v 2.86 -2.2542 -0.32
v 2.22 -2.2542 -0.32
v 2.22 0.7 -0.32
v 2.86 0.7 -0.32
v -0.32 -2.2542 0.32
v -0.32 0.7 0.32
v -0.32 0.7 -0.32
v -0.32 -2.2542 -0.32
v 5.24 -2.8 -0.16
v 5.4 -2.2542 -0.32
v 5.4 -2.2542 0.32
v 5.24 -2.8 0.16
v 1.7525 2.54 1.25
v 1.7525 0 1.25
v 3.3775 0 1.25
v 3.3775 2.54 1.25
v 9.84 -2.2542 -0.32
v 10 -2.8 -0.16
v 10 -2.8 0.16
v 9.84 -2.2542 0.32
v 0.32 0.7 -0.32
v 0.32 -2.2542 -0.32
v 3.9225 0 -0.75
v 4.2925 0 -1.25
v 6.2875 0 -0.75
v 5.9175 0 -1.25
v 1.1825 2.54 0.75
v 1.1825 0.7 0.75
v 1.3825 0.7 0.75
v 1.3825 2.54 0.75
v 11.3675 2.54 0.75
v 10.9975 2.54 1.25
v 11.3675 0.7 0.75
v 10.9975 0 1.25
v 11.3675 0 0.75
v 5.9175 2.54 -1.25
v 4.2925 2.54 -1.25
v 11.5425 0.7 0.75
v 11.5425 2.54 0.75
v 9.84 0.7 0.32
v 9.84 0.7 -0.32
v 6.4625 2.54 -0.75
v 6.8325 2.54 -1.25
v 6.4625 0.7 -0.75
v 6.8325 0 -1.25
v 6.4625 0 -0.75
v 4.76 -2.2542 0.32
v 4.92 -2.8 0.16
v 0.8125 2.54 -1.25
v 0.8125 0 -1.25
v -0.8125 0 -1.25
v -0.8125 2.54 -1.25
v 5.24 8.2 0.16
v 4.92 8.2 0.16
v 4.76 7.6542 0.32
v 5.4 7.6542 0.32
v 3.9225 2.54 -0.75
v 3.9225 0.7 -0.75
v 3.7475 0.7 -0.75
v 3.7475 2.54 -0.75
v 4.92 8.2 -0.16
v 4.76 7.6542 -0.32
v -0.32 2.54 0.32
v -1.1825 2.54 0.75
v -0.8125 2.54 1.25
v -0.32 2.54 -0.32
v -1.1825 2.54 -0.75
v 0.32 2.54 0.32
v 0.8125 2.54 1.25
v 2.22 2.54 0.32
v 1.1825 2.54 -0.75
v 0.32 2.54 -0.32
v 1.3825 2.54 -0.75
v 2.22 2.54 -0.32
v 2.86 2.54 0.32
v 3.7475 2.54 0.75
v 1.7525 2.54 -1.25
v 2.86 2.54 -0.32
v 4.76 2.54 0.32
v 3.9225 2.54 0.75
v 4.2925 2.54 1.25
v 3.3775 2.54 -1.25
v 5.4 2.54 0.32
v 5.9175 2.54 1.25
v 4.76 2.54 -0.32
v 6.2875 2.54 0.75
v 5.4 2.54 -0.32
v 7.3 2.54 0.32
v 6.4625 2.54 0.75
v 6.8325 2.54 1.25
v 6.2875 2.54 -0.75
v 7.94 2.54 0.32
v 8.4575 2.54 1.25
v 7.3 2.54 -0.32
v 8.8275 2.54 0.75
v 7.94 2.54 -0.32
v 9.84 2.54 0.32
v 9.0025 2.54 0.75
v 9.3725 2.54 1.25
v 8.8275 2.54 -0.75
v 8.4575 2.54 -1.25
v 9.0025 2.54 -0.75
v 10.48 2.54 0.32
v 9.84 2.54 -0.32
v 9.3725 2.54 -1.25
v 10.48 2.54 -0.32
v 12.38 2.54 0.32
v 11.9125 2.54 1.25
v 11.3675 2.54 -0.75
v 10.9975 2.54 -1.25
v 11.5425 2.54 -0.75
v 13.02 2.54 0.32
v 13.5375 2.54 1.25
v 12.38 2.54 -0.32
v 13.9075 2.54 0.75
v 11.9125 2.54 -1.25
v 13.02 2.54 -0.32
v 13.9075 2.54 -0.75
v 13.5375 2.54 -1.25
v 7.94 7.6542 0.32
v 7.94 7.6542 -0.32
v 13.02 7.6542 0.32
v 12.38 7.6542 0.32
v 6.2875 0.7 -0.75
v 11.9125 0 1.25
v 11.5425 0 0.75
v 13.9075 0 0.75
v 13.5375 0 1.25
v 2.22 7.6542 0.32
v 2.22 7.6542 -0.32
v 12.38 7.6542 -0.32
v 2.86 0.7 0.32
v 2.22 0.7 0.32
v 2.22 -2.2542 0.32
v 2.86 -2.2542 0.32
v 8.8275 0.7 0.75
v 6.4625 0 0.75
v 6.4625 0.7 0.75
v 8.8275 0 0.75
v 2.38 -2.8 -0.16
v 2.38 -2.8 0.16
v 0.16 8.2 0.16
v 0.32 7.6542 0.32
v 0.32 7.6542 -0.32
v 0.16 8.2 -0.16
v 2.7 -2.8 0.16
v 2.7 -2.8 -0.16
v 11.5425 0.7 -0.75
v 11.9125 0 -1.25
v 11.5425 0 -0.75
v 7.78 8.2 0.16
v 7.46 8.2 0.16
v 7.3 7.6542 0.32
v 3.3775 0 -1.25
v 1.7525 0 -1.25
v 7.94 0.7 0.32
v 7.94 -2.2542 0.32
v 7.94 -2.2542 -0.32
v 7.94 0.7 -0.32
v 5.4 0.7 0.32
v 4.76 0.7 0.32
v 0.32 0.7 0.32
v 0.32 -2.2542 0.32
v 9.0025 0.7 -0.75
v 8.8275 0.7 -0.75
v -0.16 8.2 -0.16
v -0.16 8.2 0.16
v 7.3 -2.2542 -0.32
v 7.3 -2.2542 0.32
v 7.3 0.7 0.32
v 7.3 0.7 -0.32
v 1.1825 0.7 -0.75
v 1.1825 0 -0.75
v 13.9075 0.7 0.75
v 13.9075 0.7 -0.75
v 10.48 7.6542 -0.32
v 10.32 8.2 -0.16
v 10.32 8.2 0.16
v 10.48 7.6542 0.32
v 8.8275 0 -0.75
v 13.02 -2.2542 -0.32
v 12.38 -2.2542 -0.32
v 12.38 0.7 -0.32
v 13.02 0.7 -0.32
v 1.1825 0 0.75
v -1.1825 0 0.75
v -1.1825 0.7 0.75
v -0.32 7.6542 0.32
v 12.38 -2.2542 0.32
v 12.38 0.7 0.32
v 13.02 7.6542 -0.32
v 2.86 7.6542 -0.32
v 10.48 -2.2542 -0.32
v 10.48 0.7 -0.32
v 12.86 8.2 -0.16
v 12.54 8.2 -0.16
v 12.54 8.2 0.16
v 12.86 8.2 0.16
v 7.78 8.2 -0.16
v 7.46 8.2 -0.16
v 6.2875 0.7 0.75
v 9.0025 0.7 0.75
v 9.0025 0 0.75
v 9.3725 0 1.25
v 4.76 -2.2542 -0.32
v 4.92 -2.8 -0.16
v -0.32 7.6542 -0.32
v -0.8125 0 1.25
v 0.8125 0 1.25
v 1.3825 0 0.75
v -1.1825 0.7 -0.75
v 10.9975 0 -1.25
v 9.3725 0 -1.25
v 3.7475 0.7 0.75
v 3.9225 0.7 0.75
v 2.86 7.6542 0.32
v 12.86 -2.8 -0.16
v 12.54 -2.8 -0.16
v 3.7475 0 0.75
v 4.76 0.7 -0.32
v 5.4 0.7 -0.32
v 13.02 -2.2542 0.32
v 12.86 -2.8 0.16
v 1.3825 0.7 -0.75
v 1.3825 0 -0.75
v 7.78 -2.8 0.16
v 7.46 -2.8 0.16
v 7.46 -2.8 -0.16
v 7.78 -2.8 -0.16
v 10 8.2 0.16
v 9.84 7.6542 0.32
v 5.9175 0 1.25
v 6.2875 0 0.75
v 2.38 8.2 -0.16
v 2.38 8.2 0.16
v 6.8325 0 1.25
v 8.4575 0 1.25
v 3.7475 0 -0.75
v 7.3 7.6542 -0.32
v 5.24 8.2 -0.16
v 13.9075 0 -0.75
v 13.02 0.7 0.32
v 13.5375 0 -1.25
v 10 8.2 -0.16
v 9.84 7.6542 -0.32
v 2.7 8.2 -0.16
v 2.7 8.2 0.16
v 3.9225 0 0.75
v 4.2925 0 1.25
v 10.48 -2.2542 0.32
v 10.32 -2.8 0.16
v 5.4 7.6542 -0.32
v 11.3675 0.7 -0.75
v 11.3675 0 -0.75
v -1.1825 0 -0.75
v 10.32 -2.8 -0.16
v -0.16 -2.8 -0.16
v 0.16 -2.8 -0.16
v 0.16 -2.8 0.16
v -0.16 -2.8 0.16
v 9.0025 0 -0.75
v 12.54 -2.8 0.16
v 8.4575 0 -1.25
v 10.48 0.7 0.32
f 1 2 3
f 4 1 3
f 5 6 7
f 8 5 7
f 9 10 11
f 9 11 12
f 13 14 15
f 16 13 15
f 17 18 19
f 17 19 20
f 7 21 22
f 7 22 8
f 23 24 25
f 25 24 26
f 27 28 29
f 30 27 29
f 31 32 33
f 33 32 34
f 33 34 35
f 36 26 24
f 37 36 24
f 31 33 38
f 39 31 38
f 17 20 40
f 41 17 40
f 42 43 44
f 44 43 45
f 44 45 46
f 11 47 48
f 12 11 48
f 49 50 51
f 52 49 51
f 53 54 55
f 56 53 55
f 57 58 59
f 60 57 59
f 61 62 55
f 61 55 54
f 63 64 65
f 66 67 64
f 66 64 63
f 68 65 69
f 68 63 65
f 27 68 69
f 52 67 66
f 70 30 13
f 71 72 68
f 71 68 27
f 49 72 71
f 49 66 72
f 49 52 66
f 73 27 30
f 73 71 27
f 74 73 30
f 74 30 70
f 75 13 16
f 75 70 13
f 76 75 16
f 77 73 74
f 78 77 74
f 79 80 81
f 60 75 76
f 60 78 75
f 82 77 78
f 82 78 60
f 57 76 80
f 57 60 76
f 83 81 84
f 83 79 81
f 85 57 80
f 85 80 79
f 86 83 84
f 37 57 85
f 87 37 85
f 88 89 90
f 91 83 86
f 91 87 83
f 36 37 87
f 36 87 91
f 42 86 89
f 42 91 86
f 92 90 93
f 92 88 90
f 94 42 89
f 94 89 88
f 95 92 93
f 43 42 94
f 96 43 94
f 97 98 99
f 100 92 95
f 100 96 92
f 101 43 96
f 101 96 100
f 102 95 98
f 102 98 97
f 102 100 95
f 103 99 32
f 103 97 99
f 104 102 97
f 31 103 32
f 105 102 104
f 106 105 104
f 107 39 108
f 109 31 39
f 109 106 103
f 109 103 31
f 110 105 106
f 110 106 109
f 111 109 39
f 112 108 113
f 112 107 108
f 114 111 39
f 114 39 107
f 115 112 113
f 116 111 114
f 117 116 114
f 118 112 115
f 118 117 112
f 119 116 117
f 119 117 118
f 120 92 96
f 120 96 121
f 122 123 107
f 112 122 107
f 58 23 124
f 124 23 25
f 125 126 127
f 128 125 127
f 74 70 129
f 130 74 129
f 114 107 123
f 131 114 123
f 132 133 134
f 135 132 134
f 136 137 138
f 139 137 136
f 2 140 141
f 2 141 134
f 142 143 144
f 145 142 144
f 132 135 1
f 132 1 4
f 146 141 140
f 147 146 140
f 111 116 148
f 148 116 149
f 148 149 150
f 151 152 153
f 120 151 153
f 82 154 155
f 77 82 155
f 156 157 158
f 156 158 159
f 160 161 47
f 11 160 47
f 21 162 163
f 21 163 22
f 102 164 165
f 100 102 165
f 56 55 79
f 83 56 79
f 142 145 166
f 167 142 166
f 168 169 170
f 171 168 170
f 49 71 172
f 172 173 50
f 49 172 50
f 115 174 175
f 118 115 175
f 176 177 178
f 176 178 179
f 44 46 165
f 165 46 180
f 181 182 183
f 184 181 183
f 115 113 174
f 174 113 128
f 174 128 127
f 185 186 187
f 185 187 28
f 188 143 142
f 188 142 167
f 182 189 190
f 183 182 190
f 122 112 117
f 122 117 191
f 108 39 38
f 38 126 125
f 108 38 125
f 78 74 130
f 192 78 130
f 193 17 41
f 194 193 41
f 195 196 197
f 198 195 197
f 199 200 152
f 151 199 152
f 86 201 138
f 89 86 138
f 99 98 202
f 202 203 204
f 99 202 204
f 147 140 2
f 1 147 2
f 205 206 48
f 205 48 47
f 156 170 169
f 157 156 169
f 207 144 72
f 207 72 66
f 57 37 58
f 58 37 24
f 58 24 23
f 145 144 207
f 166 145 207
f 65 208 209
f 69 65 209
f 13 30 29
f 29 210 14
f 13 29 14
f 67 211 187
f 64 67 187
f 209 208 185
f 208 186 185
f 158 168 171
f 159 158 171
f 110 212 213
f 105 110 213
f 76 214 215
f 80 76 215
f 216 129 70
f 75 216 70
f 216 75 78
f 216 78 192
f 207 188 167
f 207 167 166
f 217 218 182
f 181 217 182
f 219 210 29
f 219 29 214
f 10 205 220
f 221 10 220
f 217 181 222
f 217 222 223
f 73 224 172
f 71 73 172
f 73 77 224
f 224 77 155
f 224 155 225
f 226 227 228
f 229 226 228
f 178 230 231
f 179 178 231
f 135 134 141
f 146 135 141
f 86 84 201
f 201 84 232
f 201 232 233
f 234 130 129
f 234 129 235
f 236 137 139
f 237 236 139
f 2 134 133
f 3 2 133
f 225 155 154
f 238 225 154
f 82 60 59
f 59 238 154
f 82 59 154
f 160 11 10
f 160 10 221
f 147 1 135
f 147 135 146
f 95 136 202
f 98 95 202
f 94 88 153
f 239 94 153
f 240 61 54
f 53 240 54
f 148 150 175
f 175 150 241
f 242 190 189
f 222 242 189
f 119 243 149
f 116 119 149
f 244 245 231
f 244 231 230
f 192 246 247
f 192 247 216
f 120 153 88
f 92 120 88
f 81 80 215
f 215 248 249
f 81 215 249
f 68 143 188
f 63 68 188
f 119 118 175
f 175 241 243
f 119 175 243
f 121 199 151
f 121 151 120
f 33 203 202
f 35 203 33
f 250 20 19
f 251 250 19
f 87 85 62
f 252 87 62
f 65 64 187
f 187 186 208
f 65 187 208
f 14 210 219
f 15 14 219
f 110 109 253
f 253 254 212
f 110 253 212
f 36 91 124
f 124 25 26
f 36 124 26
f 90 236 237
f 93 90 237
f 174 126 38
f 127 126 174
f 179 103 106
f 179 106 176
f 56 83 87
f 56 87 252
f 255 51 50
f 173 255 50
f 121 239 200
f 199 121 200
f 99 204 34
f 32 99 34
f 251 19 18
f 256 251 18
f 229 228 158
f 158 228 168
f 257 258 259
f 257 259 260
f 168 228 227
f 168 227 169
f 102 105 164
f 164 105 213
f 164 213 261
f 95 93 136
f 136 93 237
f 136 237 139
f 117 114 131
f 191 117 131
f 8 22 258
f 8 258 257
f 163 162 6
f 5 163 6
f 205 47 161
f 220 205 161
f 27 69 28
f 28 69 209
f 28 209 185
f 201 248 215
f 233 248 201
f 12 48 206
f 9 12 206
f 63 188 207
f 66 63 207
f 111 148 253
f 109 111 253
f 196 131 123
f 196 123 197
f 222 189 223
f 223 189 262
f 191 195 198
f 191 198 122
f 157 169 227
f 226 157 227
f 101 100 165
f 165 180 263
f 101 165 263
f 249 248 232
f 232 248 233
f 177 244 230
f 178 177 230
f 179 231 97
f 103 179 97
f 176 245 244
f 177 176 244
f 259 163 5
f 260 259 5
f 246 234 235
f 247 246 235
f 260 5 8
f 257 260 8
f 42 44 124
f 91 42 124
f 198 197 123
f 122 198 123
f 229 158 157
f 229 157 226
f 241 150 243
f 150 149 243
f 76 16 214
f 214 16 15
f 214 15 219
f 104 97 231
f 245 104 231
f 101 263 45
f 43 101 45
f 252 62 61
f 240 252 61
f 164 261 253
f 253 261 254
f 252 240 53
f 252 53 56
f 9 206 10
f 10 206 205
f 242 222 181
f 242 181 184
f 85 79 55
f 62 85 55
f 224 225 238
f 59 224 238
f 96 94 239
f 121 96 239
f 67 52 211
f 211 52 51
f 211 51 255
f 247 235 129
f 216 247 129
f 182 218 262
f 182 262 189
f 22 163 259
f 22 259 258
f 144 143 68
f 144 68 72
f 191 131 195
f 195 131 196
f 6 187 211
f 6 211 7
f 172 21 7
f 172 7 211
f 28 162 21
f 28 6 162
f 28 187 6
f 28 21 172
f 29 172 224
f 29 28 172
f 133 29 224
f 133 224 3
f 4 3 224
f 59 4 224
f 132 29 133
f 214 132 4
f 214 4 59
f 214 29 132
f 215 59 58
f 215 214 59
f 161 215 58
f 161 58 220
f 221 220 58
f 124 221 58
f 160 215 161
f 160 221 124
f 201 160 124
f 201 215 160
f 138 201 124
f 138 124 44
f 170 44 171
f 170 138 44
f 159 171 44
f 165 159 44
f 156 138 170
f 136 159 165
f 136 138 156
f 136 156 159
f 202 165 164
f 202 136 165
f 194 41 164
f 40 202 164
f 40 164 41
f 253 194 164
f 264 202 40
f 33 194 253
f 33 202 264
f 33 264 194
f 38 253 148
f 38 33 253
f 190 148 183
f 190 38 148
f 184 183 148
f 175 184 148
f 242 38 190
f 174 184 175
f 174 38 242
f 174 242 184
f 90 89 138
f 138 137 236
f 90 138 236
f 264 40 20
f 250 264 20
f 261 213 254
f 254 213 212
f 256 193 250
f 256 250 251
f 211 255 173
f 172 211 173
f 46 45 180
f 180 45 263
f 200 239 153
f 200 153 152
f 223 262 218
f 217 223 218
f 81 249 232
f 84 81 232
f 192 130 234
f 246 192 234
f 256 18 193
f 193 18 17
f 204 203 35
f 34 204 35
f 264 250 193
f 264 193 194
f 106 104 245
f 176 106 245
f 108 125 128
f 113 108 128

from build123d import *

# Parameters (mm, degrees)
BOSS_EXTRUDE3_DEPTH = 2.54
BOSS_EXTRUDE4_DEPTH = 2.54
LPATTERN1_COUNT     = 5
LPATTERN1_PITCH     = 2.54
SKETCH8_W           = 100
SKETCH8_H           = 1.5
CUT_EXTRUDE4_DEPTH  = 0.7
BOSS_EXTRUDE5_START = -8.2
SKETCH3_W           = 0.64
SKETCH3_H           = 0.64
BOSS_EXTRUDE5_DEPTH = 11
CHAMFER1_SIZE       = 0.16
CHAMFER1_SIZE2      = 0.5458
CHAMFER2_SIZE       = 0.16
CHAMFER2_SIZE2      = 0.5458
LPATTERN2_START     = 2.22
LPATTERN2_DEPTH     = 0.64
LPATTERN2_START_2   = 4.76
LPATTERN2_2_DEPTH   = 0.64
LPATTERN2_START_3   = 7.3
LPATTERN2_3_DEPTH   = 0.64
LPATTERN2_START_4   = 9.84
LPATTERN2_4_DEPTH   = 0.64
LPATTERN2_START_5   = 12.38
LPATTERN2_5_DEPTH   = 0.64
LPATTERN2_START_6   = -1
LPATTERN2_6_DEPTH   = 2


with BuildPart() as part:
    # Sketch6 → Boss-Extrude3 (new body)
    with BuildSketch(Plane(origin=(0, 0, 0), x_dir=(1, 0, 0), z_dir=(0, 1, 0))):
        Polygon((-1.1825, 0.75), (-1.1825, -0.75), (-0.812519462, -1.25), (0.812519462, -1.25), (1.1825, -0.75), (1.1825, 0.75), (0.812519462, 1.25), (-0.812519462, 1.25), align=None)
    extrude(amount=BOSS_EXTRUDE3_DEPTH)

    # Sketch7 → Boss-Extrude4 (add)
    with BuildSketch(Plane(origin=(0, 0, 0), x_dir=(1, 0, 0), z_dir=(0, 1, 0))):
        Polygon((1.1825, 0.75), (1.1825, -0.75), (1.3825, -0.75), (1.752480538, -1.25), (3.377519462, -1.25), (3.7475, -0.75), (3.7475, 0.75), (3.377519462, 1.25), (1.752480538, 1.25), (1.3825, 0.75), align=None)
    boss_extrude4 = extrude(amount=BOSS_EXTRUDE4_DEPTH)

    # LPattern1: Boss-Extrude4 ×5
    with Locations(*[(i * LPATTERN1_PITCH, 0, 0) for i in range(1, LPATTERN1_COUNT)]):
        add(boss_extrude4)

    # Sketch8 → Cut-Extrude4 (cut)
    with BuildSketch(Plane.XZ):
        with Locations((48.8175, 0)):
            Rectangle(SKETCH8_W, SKETCH8_H)
    extrude(amount=-CUT_EXTRUDE4_DEPTH, mode=Mode.SUBTRACT)

    # Sketch3 → Boss-Extrude5 (add)
    with BuildSketch(Plane(origin=(0, 0, 0), x_dir=(-1, 0, 0), z_dir=(0, -1, 0)).offset(BOSS_EXTRUDE5_START)):
        Rectangle(SKETCH3_W, SKETCH3_H)
    extrude(amount=BOSS_EXTRUDE5_DEPTH)

    # Chamfer1
    chamfer1_edges = [part.edges().sort_by_distance(p)[0] for p in [
        (-0.32, -2.8, 0),
        (0, -2.8, -0.32),
        (0.32, -2.8, 0),
        (0, -2.8, 0.32),
    ]]
    chamfer1_side = [part.faces().sort_by_distance(p)[0] for p in [
        (0, -2.8, 0),
    ]]
    chamfer(chamfer1_edges, length=CHAMFER1_SIZE, length2=CHAMFER1_SIZE2, reference=chamfer1_side[0])

    # Chamfer2
    chamfer2_edges = [part.edges().sort_by_distance(p)[0] for p in [
        (-0.32, 8.2, 0),
        (0, 8.2, 0.32),
        (0.32, 8.2, 0),
        (0, 8.2, -0.32),
    ]]
    chamfer2_side = [part.faces().sort_by_distance(p)[0] for p in [
        (0, 8.2, 0),
    ]]
    chamfer(chamfer2_edges, length=CHAMFER2_SIZE, length2=CHAMFER2_SIZE2, reference=chamfer2_side[0])

    # LPattern2: read off the stored shape, not the designer's step
    # LPattern2 outline → LPattern2 (add)
    with BuildSketch(Plane.YZ.offset(LPATTERN2_START)):
        Polygon((-2.2542, 0.32), (-2.8, 0.16), (-2.8, -0.16), (-2.2542, -0.32), (0.7, -0.32), (0.7, 0.32), align=None)
        Polygon((2.54, 0.32), (2.54, -0.32), (7.6542, -0.32), (8.2, -0.16), (8.2, 0.16), (7.6542, 0.32), align=None)
    extrude(amount=LPATTERN2_DEPTH)

    # LPattern2 2 outline → LPattern2 2 (add)
    with BuildSketch(Plane.YZ.offset(LPATTERN2_START_2)):
        Polygon((-2.2542, 0.32), (-2.8, 0.16), (-2.8, -0.16), (-2.2542, -0.32), (0.7, -0.32), (0.7, 0.32), align=None)
        Polygon((2.54, 0.32), (2.54, -0.32), (7.6542, -0.32), (8.2, -0.16), (8.2, 0.16), (7.6542, 0.32), align=None)
    extrude(amount=LPATTERN2_2_DEPTH)

    # LPattern2 3 outline → LPattern2 3 (add)
    with BuildSketch(Plane.YZ.offset(LPATTERN2_START_3)):
        Polygon((-2.2542, 0.32), (-2.8, 0.16), (-2.8, -0.16), (-2.2542, -0.32), (0.7, -0.32), (0.7, 0.32), align=None)
        Polygon((2.54, 0.32), (2.54, -0.32), (7.6542, -0.32), (8.2, -0.16), (8.2, 0.16), (7.6542, 0.32), align=None)
    extrude(amount=LPATTERN2_3_DEPTH)

    # LPattern2 4 outline → LPattern2 4 (add)
    with BuildSketch(Plane.YZ.offset(LPATTERN2_START_4)):
        Polygon((-2.2542, 0.32), (-2.8, 0.16), (-2.8, -0.16), (-2.2542, -0.32), (0.7, -0.32), (0.7, 0.32), align=None)
        Polygon((2.54, 0.32), (2.54, -0.32), (7.6542, -0.32), (8.2, -0.16), (8.2, 0.16), (7.6542, 0.32), align=None)
    extrude(amount=LPATTERN2_4_DEPTH)

    # LPattern2 5 outline → LPattern2 5 (add)
    with BuildSketch(Plane.YZ.offset(LPATTERN2_START_5)):
        Polygon((-2.2542, 0.32), (-2.8, 0.16), (-2.8, -0.16), (-2.2542, -0.32), (0.7, -0.32), (0.7, 0.32), align=None)
        Polygon((2.54, 0.32), (2.54, -0.32), (7.6542, -0.32), (8.2, -0.16), (8.2, 0.16), (7.6542, 0.32), align=None)
    extrude(amount=LPATTERN2_5_DEPTH)

    # LPattern2 6 outline → LPattern2 6 (cut)
    with BuildSketch(Plane.XY.offset(LPATTERN2_START_6)):
        Polygon((2.86, -2.8), (2.86, -2.2542), (2.7, -2.8), align=None)
        Polygon((2.22, -2.8), (2.38, -2.8), (2.22, -2.2542), align=None)
        Polygon((4.76, -2.8), (4.92, -2.8), (4.76, -2.2542), align=None)
        Polygon((5.4, -2.2542), (5.24, -2.8), (5.4, -2.8), align=None)
        Polygon((7.3, -2.8), (7.46, -2.8), (7.3, -2.2542), align=None)
        Polygon((7.94, -2.2542), (7.78, -2.8), (7.94, -2.8), align=None)
        Polygon((9.84, -2.8), (10, -2.8), (9.84, -2.2542), align=None)
        Polygon((10.48, -2.2542), (10.32, -2.8), (10.48, -2.8), align=None)
        Polygon((12.38, -2.8), (12.54, -2.8), (12.38, -2.2542), align=None)
        Polygon((13.02, -2.2542), (12.86, -2.8), (13.02, -2.8), align=None)
        Polygon((2.22, 7.6542), (2.38, 8.2), (2.22, 8.2), align=None)
        Polygon((2.86, 8.2), (2.7, 8.2), (2.86, 7.6542), align=None)
        Polygon((4.76, 7.6542), (4.92, 8.2), (4.76, 8.2), align=None)
        Polygon((5.24, 8.2), (5.4, 7.6542), (5.4, 8.2), align=None)
        Polygon((7.3, 7.6542), (7.46, 8.2), (7.3, 8.2), align=None)
        Polygon((7.78, 8.2), (7.94, 7.6542), (7.94, 8.2), align=None)
        Polygon((9.84, 7.6542), (10, 8.2), (9.84, 8.2), align=None)
        Polygon((10.32, 8.2), (10.48, 7.6542), (10.48, 8.2), align=None)
        Polygon((12.38, 7.6542), (12.54, 8.2), (12.38, 8.2), align=None)
        Polygon((12.86, 8.2), (13.02, 7.6542), (13.02, 8.2), align=None)
    extrude(amount=LPATTERN2_6_DEPTH, mode=Mode.SUBTRACT)


solid = part.part
